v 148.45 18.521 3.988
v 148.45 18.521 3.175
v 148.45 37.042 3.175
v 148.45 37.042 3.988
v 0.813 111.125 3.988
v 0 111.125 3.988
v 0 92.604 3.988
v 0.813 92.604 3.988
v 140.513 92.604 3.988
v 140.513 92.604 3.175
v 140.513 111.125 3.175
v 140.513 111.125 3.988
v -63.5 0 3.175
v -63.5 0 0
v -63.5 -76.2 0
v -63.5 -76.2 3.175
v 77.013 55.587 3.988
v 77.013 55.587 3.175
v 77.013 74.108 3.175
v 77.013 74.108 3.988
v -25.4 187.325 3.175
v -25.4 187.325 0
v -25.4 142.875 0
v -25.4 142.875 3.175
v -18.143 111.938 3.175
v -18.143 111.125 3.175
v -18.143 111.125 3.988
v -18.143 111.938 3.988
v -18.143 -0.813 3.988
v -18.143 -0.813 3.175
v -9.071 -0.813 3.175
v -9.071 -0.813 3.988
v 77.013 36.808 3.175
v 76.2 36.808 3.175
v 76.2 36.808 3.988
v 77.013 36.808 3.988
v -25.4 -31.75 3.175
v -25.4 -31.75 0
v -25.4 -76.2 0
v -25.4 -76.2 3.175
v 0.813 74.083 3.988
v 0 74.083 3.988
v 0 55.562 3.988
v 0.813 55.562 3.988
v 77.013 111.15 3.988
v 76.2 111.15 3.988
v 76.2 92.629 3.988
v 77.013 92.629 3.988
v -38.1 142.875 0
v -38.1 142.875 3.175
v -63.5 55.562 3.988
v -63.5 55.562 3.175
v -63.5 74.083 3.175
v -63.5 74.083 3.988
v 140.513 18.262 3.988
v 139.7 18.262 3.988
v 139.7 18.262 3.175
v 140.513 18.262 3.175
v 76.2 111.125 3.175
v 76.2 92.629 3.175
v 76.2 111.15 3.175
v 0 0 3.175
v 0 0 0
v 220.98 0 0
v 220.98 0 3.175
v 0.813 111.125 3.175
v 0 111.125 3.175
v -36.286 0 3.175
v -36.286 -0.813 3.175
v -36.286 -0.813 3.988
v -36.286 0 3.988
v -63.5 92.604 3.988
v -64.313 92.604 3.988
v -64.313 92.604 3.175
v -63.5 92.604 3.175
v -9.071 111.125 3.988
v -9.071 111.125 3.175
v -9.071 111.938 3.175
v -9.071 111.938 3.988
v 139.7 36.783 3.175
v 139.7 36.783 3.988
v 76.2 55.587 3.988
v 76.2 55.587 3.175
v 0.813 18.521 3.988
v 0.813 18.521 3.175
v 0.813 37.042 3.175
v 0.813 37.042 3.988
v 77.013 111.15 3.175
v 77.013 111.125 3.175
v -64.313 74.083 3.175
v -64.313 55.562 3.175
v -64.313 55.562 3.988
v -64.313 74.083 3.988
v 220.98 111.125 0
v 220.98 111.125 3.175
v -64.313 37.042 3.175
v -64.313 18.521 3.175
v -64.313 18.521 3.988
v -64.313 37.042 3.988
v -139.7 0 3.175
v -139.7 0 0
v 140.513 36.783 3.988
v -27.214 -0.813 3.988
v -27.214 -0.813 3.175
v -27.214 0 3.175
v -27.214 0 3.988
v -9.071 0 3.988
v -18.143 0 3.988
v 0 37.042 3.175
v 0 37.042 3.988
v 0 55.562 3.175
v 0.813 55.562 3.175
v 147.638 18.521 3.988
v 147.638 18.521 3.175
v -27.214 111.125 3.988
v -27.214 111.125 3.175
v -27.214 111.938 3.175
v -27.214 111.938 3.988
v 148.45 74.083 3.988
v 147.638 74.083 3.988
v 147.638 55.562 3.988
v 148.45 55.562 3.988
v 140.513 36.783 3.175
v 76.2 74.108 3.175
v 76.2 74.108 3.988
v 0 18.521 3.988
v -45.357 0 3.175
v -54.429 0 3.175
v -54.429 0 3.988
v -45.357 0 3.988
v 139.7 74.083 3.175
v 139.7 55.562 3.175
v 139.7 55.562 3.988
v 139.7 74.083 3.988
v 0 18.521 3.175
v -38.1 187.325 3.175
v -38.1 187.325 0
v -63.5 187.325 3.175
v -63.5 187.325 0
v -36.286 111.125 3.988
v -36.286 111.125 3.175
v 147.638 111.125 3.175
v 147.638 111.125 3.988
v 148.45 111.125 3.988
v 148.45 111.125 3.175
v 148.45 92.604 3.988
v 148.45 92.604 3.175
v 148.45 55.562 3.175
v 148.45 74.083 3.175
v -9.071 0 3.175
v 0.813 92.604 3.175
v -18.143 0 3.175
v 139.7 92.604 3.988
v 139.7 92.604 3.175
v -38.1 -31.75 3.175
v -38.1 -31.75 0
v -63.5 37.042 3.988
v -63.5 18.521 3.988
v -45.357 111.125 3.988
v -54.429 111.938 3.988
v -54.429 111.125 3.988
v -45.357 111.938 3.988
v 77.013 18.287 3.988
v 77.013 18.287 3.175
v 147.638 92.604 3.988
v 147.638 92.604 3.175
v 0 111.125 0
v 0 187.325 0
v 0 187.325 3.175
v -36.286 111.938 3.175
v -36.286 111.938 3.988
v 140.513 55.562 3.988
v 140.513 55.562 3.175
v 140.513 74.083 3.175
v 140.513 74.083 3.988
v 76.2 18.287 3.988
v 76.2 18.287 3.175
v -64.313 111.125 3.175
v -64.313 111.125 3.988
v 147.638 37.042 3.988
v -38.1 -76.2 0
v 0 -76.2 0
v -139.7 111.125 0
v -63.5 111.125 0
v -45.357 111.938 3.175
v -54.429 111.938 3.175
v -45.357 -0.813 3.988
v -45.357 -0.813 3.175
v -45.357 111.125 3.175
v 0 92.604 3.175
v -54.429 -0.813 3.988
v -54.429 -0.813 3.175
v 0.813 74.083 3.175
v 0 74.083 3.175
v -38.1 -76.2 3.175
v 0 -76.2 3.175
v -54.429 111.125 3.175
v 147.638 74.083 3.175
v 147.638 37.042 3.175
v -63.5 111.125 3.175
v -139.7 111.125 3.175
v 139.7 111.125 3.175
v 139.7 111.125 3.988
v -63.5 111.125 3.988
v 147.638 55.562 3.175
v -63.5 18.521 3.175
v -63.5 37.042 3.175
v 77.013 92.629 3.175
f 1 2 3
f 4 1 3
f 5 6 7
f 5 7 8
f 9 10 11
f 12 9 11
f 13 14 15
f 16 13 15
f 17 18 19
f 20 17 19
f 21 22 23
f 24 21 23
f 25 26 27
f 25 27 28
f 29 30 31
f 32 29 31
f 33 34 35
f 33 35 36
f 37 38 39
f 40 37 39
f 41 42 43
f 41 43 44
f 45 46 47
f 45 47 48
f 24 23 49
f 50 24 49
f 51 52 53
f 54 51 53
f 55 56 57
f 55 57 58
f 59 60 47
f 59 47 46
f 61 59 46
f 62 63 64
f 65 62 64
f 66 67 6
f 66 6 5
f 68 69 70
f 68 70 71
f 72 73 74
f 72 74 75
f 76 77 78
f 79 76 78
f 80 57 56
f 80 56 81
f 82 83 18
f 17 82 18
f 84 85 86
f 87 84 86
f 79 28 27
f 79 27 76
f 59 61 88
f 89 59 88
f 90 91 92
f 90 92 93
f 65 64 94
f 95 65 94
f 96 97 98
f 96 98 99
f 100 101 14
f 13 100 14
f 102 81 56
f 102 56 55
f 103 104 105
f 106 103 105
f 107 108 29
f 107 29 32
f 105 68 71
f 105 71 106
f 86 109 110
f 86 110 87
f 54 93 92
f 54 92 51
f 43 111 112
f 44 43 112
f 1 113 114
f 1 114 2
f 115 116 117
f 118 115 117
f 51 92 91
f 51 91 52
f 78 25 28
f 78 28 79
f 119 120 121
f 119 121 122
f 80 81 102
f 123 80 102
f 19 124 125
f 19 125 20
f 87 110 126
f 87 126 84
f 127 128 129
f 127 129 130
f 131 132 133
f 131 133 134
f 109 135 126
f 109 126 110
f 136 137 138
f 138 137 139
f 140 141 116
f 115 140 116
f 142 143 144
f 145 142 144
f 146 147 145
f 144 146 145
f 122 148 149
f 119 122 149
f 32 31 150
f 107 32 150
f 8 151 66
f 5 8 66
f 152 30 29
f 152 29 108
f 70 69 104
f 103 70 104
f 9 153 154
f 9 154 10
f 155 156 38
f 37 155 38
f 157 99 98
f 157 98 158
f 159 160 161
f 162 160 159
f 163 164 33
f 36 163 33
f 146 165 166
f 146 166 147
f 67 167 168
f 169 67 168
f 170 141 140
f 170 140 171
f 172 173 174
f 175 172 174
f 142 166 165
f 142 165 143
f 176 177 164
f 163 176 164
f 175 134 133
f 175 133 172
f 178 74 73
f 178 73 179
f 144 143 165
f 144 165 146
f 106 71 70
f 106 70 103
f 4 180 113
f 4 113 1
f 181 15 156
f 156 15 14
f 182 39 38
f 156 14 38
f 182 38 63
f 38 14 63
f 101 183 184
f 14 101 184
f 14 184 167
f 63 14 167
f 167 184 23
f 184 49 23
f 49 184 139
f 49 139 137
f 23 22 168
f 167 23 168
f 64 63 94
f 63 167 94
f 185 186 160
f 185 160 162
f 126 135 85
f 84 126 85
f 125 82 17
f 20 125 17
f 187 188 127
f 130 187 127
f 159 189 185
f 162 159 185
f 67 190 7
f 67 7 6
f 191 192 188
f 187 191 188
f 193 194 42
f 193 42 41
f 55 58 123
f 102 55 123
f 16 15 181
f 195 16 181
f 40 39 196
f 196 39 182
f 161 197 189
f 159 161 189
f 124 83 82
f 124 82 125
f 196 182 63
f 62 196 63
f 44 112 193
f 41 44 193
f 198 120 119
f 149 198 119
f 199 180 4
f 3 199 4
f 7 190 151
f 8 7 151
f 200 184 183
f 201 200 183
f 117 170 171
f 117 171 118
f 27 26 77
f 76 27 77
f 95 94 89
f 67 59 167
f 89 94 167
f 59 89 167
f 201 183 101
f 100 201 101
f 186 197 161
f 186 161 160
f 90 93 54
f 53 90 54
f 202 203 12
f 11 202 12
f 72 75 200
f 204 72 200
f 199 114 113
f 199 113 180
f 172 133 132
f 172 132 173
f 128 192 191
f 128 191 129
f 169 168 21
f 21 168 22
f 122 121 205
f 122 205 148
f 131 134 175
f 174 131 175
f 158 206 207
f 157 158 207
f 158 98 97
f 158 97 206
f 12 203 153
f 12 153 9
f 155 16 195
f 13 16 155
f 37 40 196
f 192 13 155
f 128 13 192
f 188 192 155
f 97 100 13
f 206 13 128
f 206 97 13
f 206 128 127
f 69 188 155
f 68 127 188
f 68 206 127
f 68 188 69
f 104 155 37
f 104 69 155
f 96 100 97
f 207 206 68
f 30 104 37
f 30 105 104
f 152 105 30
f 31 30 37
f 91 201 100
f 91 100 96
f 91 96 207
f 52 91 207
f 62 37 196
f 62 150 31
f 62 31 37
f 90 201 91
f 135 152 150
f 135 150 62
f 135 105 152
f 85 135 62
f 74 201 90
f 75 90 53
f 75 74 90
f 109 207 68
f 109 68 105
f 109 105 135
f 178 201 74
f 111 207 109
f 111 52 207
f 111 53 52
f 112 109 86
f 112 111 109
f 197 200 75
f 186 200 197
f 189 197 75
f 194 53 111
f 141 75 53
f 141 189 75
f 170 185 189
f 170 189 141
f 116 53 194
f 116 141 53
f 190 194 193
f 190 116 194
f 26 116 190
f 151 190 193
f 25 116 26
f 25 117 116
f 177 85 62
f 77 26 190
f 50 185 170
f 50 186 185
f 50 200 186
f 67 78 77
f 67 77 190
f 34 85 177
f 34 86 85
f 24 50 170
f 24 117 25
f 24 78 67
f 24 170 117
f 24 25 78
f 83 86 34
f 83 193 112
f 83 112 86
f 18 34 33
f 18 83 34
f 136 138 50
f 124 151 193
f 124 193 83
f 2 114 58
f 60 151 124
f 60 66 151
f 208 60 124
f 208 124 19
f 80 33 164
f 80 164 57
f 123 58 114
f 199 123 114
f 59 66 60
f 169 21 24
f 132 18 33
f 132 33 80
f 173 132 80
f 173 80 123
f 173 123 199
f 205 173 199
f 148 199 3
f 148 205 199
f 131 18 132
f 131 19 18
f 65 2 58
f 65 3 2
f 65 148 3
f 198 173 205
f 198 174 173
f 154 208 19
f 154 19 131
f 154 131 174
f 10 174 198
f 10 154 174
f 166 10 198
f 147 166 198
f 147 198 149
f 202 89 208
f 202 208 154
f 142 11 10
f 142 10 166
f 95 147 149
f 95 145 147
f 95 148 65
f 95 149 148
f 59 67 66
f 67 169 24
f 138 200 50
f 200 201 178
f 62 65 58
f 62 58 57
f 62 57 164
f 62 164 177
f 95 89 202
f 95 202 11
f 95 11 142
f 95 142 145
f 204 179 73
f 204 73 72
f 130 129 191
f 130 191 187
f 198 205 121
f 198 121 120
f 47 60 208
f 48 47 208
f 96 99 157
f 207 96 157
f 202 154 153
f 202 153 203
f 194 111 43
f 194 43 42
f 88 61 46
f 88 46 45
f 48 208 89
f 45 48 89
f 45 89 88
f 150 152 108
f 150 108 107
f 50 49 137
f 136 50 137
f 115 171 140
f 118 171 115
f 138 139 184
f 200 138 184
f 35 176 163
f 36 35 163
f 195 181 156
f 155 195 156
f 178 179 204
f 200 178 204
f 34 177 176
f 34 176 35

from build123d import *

# Parameters (mm, degrees)
F1_DEPTH = 3.175
F2_W     = 0.8128
F2_H     = 18.520833
F2_H_2   = 18.520834
F2_W_2   = 9.071428
F2_H_3   = 0.8128
F3_DEPTH = 0.8128


with BuildPart() as f1:
    # F0 (on Top) → F1 (new body)
    with BuildSketch(Plane.XY):
        Polygon((0, 111.125), (0, 187.325), (-25.4, 187.325), (-25.4, 142.875), (-38.1, 142.875), (-38.1, 187.325), (-63.5, 187.325), (-63.5, 111.125), (-139.7, 111.125), (-139.7, 0), (-63.5, 0), (-63.5, -76.2), (-38.1, -76.2), (-38.1, -31.75), (-25.4, -31.75), (-25.4, -76.2), (0, -76.2), (0, 0), (220.98, 0), (220.98, 111.125), align=None)
    extrude(amount=F1_DEPTH)

    # F2 (on face) → F3 (join)
    with BuildSketch(Plane.XY.offset(3.175)):
        with Locations((-63.9064, 101.864583)):
            Rectangle(F2_W, F2_H)
        with Locations((-63.9064, 64.822916)):
            Rectangle(F2_W, F2_H)
        with Locations((-63.9064, 27.78125)):
            Rectangle(F2_W, F2_H_2)
        with Locations((0.4064, 27.78125)):
            Rectangle(F2_W, F2_H_2)
        with Locations((0.4064, 64.822916)):
            Rectangle(F2_W, F2_H)
        with Locations((0.4064, 101.864583)):
            Rectangle(F2_W, F2_H)
        with Locations((76.6064, 101.889292)):
            Rectangle(F2_W, F2_H_2)
        with Locations((76.6064, 64.847625)):
            Rectangle(F2_W, F2_H)
        with Locations((76.6064, 27.547179)):
            Rectangle(F2_W, F2_H)
        with Locations((140.1064, 101.864583)):
            Rectangle(F2_W, F2_H)
        with Locations((140.1064, 27.52247)):
            Rectangle(F2_W, F2_H)
        with Locations((140.1064, 64.822916)):
            Rectangle(F2_W, F2_H)
        with Locations((148.0439, 101.864583)):
            Rectangle(F2_W, F2_H)
        with Locations((148.0439, 64.822916)):
            Rectangle(F2_W, F2_H)
        with Locations((148.0439, 27.78125)):
            Rectangle(F2_W, F2_H_2)
        with Locations((-49.892857, -0.4064)):
            Rectangle(F2_W_2, F2_H_3)
        with Locations((-31.75, -0.4064)):
            Rectangle(F2_W_2, F2_H_3)
        with Locations((-13.607143, -0.4064)):
            Rectangle(F2_W_2, F2_H_3)
        with Locations((-31.75, 111.5314)):
            Rectangle(F2_W_2, F2_H_3)
        with Locations((-13.607143, 111.5314)):
            Rectangle(F2_W_2, F2_H_3)
        with Locations((-49.892857, 111.5314)):
            Rectangle(F2_W_2, F2_H_3)
    extrude(amount=F3_DEPTH)


solid = f1.part
